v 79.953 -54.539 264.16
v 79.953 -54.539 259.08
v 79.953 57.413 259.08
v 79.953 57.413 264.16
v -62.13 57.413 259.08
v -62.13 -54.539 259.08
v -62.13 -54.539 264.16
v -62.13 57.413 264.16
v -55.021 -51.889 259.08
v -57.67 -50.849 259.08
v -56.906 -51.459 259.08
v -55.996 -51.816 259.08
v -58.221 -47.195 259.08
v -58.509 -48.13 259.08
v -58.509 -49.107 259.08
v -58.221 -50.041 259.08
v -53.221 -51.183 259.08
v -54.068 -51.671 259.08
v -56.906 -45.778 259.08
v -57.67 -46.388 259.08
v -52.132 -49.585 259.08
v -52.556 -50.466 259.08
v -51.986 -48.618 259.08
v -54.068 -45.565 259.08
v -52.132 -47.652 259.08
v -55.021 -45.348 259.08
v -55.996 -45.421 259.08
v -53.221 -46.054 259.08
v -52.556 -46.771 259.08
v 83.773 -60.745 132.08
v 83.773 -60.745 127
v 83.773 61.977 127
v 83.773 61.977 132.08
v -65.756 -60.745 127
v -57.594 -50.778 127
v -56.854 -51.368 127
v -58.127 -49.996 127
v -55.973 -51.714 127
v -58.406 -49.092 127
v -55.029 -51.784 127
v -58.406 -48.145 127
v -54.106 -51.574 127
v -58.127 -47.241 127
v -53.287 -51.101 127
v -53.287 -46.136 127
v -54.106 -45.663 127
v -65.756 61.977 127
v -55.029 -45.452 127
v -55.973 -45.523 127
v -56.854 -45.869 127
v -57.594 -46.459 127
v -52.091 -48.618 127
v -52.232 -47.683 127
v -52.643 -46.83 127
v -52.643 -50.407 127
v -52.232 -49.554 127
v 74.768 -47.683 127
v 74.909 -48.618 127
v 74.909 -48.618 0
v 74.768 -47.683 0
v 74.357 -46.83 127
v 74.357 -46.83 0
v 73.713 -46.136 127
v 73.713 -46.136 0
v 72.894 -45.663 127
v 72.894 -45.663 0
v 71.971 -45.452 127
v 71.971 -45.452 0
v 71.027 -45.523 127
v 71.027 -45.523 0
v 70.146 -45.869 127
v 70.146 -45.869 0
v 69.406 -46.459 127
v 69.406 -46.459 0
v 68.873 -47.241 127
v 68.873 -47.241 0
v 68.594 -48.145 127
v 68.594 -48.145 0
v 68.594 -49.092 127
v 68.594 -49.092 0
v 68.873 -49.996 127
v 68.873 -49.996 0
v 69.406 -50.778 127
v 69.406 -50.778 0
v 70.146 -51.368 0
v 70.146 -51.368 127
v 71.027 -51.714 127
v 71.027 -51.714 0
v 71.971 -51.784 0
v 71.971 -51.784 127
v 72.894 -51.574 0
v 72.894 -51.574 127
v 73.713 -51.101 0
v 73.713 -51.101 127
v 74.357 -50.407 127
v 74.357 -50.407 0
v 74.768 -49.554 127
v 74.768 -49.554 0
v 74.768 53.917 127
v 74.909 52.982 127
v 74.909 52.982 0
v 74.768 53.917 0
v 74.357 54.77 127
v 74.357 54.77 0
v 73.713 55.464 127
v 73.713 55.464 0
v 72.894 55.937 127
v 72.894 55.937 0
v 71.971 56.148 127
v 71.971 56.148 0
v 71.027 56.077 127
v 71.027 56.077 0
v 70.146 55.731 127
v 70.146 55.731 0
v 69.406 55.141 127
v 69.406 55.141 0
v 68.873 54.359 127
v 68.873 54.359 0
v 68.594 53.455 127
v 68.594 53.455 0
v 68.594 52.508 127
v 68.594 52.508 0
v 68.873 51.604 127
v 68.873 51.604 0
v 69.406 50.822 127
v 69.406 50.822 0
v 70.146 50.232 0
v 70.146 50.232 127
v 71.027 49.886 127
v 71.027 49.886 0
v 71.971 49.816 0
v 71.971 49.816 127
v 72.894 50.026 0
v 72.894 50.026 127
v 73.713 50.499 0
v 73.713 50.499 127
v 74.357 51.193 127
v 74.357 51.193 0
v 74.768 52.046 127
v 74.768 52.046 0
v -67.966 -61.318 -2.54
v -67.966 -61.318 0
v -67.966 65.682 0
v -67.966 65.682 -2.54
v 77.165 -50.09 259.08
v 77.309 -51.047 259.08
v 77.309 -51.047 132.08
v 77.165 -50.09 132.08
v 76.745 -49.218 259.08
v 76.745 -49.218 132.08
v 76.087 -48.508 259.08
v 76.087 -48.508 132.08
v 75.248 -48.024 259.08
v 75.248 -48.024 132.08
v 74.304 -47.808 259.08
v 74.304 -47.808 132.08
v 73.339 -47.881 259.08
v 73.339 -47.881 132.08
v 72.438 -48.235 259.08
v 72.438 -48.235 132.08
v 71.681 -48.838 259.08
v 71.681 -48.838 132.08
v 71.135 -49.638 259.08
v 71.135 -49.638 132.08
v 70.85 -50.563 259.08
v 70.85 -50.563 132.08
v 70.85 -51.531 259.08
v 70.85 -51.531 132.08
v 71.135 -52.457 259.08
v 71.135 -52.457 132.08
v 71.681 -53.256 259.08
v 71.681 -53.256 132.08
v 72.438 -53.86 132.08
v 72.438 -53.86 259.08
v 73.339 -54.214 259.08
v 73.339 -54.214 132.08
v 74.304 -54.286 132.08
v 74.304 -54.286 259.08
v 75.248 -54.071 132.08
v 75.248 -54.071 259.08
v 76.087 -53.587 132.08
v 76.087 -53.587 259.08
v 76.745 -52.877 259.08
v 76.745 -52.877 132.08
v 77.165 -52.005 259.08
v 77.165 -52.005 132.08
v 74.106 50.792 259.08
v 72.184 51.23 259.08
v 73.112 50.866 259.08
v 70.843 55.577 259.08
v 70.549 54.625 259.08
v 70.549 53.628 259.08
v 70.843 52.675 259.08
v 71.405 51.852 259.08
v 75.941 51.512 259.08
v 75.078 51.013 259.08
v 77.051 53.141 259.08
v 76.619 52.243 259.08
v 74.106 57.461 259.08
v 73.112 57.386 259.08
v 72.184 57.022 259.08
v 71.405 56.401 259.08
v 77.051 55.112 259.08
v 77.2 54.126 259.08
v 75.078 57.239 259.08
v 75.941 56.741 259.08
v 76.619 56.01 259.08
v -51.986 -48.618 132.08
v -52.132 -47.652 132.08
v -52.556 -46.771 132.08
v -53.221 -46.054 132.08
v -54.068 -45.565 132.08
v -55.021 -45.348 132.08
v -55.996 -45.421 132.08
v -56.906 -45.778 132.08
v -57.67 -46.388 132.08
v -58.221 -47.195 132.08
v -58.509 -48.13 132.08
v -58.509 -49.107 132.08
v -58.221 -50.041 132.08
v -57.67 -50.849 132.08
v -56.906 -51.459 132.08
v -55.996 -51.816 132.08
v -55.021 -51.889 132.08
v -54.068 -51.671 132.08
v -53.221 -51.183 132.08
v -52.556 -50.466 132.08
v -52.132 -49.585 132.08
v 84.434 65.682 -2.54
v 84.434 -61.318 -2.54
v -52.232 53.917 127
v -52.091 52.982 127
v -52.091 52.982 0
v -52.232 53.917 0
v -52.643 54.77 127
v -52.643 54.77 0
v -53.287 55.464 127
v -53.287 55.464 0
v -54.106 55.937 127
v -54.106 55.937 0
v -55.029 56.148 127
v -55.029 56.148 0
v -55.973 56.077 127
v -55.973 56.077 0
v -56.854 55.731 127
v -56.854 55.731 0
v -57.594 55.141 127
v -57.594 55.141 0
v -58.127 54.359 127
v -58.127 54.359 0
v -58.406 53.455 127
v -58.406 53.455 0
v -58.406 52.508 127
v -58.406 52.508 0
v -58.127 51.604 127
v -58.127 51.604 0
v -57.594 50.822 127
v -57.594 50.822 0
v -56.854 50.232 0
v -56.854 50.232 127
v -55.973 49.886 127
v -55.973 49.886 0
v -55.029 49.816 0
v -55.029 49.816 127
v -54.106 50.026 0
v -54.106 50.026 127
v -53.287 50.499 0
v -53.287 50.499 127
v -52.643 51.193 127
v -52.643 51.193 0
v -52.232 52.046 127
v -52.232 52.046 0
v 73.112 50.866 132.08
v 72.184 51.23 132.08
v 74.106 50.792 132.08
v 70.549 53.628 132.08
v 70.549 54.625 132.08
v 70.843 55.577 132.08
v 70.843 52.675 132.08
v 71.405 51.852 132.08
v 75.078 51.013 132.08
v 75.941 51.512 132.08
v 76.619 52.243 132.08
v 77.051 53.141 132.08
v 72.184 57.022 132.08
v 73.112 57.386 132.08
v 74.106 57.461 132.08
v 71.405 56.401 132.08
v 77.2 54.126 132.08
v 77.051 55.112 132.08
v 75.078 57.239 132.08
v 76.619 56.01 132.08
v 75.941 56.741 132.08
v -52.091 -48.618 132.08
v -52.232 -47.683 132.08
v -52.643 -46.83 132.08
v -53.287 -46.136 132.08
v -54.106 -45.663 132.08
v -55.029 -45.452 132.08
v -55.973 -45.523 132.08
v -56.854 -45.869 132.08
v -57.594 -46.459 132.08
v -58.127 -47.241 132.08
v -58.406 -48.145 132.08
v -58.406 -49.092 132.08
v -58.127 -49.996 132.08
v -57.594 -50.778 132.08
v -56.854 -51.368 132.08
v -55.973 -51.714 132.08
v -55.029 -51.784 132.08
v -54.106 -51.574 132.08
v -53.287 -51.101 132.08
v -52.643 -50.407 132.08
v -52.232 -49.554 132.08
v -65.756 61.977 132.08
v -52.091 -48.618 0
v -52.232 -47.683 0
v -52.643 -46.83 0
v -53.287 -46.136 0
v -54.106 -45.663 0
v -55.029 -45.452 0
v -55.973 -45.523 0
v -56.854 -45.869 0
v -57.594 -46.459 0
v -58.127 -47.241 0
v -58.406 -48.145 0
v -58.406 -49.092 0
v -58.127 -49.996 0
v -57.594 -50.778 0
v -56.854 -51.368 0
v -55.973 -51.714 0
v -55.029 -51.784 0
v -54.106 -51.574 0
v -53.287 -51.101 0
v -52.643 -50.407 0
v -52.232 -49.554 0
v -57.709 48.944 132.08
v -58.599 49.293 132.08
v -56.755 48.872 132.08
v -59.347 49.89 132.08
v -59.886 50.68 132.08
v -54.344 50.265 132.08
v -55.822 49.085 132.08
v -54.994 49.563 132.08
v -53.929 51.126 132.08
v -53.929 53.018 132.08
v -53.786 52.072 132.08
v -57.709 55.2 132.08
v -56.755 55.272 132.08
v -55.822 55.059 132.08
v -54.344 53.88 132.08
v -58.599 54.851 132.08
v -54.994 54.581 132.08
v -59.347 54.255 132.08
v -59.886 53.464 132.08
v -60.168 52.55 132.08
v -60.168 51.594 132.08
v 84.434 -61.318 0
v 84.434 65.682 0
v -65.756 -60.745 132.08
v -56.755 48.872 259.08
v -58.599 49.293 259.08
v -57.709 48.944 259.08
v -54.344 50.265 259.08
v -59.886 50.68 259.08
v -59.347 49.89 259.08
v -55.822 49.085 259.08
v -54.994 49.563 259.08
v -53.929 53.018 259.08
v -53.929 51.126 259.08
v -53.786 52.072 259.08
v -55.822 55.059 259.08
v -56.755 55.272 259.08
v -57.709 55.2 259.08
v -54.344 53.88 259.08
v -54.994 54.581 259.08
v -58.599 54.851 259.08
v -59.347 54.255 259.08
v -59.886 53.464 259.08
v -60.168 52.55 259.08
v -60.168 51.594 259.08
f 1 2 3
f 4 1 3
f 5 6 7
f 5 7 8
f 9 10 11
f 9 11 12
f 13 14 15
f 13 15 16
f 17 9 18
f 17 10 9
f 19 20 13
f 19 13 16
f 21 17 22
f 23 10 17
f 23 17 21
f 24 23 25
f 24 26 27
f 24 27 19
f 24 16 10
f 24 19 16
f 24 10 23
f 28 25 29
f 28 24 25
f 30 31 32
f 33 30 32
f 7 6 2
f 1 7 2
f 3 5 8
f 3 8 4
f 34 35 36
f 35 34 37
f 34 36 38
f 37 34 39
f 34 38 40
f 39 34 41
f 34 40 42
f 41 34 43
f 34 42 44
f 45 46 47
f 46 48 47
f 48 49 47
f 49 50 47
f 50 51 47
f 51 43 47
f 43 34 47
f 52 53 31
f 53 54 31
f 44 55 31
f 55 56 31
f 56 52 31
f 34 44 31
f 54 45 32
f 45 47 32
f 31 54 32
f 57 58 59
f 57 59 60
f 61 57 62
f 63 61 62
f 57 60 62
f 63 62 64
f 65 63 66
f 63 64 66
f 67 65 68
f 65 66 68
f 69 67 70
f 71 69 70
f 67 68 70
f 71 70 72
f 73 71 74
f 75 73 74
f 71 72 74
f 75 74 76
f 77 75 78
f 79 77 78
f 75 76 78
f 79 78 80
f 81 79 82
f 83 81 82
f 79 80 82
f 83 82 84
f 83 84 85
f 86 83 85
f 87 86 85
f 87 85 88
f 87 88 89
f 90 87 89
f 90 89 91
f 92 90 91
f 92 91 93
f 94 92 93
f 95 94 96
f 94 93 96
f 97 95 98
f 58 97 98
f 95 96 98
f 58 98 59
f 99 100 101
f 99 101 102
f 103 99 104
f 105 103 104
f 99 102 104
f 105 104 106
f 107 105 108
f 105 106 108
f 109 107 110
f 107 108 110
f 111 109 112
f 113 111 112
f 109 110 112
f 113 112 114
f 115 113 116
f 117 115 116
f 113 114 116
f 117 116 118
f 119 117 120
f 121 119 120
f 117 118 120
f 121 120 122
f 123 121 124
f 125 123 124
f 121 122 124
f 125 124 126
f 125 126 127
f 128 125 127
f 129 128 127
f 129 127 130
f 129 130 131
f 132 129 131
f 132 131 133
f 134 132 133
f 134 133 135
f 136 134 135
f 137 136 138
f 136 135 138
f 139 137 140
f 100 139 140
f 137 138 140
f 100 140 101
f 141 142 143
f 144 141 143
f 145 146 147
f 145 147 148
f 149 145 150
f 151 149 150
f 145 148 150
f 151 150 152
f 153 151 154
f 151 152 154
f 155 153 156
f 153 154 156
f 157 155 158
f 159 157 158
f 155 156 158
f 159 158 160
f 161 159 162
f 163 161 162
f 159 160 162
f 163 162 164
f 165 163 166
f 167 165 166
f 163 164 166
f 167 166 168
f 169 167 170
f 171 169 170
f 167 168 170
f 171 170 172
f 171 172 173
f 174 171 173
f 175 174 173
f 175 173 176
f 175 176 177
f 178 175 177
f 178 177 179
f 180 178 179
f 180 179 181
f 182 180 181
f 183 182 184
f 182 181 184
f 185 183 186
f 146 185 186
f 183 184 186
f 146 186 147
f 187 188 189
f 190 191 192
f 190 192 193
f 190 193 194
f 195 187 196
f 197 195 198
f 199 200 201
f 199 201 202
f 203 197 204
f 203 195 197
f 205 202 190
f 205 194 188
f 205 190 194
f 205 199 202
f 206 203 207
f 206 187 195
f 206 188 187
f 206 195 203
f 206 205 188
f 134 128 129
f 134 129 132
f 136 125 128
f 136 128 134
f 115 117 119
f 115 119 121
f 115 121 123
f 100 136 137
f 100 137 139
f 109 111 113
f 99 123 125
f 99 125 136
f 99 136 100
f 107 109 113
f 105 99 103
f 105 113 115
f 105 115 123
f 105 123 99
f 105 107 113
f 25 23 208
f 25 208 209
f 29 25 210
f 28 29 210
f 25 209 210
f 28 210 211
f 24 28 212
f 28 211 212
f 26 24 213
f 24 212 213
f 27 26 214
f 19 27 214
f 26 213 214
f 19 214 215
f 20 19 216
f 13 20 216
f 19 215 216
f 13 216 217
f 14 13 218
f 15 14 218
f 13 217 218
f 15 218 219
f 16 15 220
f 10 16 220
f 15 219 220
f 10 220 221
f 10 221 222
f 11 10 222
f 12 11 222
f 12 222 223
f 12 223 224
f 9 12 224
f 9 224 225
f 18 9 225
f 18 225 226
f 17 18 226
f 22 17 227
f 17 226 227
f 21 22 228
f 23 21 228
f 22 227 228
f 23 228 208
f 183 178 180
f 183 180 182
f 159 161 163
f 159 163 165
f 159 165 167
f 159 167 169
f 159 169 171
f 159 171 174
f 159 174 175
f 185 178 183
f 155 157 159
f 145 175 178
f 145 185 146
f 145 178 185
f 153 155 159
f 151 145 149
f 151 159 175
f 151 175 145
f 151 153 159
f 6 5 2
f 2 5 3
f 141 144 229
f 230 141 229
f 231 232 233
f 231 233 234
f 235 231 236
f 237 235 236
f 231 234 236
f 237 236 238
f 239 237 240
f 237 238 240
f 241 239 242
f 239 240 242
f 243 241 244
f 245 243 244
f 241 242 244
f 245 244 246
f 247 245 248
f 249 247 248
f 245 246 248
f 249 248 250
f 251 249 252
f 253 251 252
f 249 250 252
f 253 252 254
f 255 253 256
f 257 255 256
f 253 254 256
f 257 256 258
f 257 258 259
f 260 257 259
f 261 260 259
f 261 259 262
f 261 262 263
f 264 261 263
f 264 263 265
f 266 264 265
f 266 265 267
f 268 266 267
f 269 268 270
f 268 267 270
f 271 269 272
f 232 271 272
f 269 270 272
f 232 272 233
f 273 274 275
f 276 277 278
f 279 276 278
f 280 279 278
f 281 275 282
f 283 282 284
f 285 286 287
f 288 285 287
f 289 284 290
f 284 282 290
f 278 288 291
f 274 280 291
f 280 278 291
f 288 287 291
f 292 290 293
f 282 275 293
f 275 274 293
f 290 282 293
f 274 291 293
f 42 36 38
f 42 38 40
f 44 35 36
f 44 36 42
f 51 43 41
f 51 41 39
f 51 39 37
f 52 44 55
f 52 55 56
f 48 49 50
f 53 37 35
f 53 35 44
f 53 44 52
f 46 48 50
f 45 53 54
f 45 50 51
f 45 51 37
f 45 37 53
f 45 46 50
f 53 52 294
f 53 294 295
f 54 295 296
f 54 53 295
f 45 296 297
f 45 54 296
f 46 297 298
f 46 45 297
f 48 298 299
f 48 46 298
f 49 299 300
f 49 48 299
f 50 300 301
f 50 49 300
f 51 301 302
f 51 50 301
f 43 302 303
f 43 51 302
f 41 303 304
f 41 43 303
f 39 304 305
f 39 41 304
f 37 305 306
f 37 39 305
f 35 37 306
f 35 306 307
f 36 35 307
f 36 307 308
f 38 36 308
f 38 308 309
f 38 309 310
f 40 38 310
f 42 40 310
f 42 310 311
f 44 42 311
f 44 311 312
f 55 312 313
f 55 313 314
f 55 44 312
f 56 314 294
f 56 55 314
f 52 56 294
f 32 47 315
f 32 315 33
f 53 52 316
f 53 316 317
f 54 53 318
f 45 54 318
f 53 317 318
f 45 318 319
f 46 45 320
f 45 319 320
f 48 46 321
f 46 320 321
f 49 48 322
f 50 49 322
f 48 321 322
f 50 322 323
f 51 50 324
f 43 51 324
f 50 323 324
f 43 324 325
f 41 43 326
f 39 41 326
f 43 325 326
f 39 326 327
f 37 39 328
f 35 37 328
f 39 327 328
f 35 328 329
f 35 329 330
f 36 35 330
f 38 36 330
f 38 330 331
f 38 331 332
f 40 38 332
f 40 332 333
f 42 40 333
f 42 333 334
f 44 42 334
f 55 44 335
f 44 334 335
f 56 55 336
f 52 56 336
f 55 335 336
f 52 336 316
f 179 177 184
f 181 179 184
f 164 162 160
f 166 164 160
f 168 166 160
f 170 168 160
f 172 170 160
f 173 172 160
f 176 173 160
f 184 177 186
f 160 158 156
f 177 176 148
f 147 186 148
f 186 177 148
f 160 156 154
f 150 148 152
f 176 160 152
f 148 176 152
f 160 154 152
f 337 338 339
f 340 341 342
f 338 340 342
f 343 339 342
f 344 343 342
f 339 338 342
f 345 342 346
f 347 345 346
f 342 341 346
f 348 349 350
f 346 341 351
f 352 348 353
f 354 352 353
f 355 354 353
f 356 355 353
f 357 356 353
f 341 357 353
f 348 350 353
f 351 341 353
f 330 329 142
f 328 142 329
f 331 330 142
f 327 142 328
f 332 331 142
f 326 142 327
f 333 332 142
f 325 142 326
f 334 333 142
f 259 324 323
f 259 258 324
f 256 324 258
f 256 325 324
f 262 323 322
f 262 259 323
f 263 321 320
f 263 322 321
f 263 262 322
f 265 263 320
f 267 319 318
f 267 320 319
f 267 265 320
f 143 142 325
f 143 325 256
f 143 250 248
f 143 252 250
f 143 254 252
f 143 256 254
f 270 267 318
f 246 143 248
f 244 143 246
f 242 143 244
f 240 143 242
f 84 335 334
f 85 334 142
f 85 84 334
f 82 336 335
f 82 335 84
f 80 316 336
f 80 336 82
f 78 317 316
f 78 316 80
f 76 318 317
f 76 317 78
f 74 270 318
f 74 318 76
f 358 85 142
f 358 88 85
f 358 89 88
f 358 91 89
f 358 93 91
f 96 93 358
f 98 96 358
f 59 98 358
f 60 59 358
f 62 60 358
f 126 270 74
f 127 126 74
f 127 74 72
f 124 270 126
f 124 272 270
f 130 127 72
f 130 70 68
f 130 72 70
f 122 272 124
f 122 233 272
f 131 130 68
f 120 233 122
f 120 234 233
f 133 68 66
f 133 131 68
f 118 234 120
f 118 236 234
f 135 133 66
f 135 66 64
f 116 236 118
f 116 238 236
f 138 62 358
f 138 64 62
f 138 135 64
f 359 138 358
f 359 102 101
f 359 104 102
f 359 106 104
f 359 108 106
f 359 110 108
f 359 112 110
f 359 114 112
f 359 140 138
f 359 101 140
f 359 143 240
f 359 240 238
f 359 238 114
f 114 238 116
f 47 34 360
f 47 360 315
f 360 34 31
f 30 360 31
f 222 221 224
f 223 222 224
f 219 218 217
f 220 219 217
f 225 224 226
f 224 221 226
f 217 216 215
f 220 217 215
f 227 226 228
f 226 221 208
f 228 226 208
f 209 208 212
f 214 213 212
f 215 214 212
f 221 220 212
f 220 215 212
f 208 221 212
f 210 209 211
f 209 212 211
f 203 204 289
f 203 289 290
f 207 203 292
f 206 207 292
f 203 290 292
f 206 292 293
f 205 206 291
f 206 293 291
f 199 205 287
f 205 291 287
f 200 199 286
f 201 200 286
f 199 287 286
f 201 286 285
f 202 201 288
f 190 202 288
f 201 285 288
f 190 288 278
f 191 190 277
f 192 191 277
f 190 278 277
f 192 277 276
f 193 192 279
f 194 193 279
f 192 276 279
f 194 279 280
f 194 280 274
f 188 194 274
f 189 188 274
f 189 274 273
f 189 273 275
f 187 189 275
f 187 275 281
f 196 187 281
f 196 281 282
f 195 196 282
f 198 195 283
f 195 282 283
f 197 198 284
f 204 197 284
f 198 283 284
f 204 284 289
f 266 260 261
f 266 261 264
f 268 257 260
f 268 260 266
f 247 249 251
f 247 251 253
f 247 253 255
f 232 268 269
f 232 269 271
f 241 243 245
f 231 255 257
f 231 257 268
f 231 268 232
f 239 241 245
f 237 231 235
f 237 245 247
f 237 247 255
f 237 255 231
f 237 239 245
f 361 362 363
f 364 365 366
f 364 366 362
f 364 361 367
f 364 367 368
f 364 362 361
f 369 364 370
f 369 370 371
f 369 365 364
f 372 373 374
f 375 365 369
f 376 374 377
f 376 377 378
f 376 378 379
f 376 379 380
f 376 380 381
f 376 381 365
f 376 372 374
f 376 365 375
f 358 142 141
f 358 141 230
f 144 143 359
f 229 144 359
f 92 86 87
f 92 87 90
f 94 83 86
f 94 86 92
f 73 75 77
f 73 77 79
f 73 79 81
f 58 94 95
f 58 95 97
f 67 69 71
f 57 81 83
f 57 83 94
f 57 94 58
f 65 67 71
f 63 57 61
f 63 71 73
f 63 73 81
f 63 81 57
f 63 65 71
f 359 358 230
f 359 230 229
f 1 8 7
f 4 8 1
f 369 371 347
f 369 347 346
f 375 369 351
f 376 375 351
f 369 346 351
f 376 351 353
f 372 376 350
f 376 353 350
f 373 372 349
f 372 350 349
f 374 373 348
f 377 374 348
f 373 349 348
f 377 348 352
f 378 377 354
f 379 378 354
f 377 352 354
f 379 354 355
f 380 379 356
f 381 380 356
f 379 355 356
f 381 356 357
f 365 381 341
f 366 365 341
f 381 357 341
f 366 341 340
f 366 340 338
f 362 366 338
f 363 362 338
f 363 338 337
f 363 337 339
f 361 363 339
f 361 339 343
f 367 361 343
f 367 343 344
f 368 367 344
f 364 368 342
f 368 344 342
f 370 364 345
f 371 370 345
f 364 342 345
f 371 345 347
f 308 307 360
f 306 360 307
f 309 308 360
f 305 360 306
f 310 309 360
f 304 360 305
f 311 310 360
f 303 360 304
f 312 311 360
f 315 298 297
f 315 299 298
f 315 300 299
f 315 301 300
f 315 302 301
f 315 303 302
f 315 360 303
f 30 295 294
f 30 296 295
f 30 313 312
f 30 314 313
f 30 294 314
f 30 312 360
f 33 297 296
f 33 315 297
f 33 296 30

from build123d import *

# Parameters (mm, degrees)
F0_W     = 152.4
F0_H     = 127
F1_DEPTH = 2.54
F2_R     = 3.175
F3_DEPTH = 127
F4_W     = 149.529047
F4_H     = 122.721277
F4_R     = 3.175
F5_DEPTH = 5.08
F6_R     = 3.279674
F6_R_2   = 3.20872
F6_R_3   = 3.343947
F6_R_4   = 3.247931
F7_DEPTH = 127
F8_W     = 142.083116
F8_H     = 111.952372
F9_DEPTH = 5.08


with BuildPart() as f1:
    # F0 (on Top) → F1 (new body)
    with BuildSketch(Plane.XY):
        with Locations((8.233837, 2.181631)):
            Rectangle(F0_W, F0_H)
    extrude(amount=-F1_DEPTH)

    # F2 (on face) → F3 (join)
    with BuildSketch(Plane.XY):
        with Locations((-55.266163, -48.618369)):
            Circle(F2_R)
        with Locations((-55.266163, 52.981631)):
            Circle(F2_R)
        with Locations((71.733837, 52.981631)):
            Circle(F2_R)
        with Locations((71.733837, -48.618369)):
            Circle(F2_R)
    extrude(amount=F3_DEPTH)


with BuildPart() as f5:
    # F4 (on face) → F5 (new body)
    with BuildSketch(Plane.XY.offset(127)):
        with Locations((9.008336, 0.615951)):
            Rectangle(F4_W, F4_H)
        with Locations((-55.266163, -48.618369)):
            Circle(F4_R, mode=Mode.SUBTRACT)
    extrude(amount=F5_DEPTH)


with BuildPart() as f7:
    # F6 (on face) → F7 (new body)
    with BuildSketch(Plane.XY.offset(132.08)):
        with Locations((-55.266163, -48.618369)):
            Circle(F6_R)
        with Locations((-56.994699, 52.072097)):
            Circle(F6_R_2)
        with Locations((73.856063, 54.126266)):
            Circle(F6_R_3)
        with Locations((74.061476, -51.047344)):
            Circle(F6_R_4)
    extrude(amount=F7_DEPTH)


with BuildPart() as f9:
    # F8 (on face) → F9 (new body)
    with BuildSketch(Plane.XY.offset(259.08)):
        with Locations((8.911427, 1.436751)):
            Rectangle(F8_W, F8_H)
    extrude(amount=F9_DEPTH)


solid = Compound([f1.part, f5.part, f7.part, f9.part])
